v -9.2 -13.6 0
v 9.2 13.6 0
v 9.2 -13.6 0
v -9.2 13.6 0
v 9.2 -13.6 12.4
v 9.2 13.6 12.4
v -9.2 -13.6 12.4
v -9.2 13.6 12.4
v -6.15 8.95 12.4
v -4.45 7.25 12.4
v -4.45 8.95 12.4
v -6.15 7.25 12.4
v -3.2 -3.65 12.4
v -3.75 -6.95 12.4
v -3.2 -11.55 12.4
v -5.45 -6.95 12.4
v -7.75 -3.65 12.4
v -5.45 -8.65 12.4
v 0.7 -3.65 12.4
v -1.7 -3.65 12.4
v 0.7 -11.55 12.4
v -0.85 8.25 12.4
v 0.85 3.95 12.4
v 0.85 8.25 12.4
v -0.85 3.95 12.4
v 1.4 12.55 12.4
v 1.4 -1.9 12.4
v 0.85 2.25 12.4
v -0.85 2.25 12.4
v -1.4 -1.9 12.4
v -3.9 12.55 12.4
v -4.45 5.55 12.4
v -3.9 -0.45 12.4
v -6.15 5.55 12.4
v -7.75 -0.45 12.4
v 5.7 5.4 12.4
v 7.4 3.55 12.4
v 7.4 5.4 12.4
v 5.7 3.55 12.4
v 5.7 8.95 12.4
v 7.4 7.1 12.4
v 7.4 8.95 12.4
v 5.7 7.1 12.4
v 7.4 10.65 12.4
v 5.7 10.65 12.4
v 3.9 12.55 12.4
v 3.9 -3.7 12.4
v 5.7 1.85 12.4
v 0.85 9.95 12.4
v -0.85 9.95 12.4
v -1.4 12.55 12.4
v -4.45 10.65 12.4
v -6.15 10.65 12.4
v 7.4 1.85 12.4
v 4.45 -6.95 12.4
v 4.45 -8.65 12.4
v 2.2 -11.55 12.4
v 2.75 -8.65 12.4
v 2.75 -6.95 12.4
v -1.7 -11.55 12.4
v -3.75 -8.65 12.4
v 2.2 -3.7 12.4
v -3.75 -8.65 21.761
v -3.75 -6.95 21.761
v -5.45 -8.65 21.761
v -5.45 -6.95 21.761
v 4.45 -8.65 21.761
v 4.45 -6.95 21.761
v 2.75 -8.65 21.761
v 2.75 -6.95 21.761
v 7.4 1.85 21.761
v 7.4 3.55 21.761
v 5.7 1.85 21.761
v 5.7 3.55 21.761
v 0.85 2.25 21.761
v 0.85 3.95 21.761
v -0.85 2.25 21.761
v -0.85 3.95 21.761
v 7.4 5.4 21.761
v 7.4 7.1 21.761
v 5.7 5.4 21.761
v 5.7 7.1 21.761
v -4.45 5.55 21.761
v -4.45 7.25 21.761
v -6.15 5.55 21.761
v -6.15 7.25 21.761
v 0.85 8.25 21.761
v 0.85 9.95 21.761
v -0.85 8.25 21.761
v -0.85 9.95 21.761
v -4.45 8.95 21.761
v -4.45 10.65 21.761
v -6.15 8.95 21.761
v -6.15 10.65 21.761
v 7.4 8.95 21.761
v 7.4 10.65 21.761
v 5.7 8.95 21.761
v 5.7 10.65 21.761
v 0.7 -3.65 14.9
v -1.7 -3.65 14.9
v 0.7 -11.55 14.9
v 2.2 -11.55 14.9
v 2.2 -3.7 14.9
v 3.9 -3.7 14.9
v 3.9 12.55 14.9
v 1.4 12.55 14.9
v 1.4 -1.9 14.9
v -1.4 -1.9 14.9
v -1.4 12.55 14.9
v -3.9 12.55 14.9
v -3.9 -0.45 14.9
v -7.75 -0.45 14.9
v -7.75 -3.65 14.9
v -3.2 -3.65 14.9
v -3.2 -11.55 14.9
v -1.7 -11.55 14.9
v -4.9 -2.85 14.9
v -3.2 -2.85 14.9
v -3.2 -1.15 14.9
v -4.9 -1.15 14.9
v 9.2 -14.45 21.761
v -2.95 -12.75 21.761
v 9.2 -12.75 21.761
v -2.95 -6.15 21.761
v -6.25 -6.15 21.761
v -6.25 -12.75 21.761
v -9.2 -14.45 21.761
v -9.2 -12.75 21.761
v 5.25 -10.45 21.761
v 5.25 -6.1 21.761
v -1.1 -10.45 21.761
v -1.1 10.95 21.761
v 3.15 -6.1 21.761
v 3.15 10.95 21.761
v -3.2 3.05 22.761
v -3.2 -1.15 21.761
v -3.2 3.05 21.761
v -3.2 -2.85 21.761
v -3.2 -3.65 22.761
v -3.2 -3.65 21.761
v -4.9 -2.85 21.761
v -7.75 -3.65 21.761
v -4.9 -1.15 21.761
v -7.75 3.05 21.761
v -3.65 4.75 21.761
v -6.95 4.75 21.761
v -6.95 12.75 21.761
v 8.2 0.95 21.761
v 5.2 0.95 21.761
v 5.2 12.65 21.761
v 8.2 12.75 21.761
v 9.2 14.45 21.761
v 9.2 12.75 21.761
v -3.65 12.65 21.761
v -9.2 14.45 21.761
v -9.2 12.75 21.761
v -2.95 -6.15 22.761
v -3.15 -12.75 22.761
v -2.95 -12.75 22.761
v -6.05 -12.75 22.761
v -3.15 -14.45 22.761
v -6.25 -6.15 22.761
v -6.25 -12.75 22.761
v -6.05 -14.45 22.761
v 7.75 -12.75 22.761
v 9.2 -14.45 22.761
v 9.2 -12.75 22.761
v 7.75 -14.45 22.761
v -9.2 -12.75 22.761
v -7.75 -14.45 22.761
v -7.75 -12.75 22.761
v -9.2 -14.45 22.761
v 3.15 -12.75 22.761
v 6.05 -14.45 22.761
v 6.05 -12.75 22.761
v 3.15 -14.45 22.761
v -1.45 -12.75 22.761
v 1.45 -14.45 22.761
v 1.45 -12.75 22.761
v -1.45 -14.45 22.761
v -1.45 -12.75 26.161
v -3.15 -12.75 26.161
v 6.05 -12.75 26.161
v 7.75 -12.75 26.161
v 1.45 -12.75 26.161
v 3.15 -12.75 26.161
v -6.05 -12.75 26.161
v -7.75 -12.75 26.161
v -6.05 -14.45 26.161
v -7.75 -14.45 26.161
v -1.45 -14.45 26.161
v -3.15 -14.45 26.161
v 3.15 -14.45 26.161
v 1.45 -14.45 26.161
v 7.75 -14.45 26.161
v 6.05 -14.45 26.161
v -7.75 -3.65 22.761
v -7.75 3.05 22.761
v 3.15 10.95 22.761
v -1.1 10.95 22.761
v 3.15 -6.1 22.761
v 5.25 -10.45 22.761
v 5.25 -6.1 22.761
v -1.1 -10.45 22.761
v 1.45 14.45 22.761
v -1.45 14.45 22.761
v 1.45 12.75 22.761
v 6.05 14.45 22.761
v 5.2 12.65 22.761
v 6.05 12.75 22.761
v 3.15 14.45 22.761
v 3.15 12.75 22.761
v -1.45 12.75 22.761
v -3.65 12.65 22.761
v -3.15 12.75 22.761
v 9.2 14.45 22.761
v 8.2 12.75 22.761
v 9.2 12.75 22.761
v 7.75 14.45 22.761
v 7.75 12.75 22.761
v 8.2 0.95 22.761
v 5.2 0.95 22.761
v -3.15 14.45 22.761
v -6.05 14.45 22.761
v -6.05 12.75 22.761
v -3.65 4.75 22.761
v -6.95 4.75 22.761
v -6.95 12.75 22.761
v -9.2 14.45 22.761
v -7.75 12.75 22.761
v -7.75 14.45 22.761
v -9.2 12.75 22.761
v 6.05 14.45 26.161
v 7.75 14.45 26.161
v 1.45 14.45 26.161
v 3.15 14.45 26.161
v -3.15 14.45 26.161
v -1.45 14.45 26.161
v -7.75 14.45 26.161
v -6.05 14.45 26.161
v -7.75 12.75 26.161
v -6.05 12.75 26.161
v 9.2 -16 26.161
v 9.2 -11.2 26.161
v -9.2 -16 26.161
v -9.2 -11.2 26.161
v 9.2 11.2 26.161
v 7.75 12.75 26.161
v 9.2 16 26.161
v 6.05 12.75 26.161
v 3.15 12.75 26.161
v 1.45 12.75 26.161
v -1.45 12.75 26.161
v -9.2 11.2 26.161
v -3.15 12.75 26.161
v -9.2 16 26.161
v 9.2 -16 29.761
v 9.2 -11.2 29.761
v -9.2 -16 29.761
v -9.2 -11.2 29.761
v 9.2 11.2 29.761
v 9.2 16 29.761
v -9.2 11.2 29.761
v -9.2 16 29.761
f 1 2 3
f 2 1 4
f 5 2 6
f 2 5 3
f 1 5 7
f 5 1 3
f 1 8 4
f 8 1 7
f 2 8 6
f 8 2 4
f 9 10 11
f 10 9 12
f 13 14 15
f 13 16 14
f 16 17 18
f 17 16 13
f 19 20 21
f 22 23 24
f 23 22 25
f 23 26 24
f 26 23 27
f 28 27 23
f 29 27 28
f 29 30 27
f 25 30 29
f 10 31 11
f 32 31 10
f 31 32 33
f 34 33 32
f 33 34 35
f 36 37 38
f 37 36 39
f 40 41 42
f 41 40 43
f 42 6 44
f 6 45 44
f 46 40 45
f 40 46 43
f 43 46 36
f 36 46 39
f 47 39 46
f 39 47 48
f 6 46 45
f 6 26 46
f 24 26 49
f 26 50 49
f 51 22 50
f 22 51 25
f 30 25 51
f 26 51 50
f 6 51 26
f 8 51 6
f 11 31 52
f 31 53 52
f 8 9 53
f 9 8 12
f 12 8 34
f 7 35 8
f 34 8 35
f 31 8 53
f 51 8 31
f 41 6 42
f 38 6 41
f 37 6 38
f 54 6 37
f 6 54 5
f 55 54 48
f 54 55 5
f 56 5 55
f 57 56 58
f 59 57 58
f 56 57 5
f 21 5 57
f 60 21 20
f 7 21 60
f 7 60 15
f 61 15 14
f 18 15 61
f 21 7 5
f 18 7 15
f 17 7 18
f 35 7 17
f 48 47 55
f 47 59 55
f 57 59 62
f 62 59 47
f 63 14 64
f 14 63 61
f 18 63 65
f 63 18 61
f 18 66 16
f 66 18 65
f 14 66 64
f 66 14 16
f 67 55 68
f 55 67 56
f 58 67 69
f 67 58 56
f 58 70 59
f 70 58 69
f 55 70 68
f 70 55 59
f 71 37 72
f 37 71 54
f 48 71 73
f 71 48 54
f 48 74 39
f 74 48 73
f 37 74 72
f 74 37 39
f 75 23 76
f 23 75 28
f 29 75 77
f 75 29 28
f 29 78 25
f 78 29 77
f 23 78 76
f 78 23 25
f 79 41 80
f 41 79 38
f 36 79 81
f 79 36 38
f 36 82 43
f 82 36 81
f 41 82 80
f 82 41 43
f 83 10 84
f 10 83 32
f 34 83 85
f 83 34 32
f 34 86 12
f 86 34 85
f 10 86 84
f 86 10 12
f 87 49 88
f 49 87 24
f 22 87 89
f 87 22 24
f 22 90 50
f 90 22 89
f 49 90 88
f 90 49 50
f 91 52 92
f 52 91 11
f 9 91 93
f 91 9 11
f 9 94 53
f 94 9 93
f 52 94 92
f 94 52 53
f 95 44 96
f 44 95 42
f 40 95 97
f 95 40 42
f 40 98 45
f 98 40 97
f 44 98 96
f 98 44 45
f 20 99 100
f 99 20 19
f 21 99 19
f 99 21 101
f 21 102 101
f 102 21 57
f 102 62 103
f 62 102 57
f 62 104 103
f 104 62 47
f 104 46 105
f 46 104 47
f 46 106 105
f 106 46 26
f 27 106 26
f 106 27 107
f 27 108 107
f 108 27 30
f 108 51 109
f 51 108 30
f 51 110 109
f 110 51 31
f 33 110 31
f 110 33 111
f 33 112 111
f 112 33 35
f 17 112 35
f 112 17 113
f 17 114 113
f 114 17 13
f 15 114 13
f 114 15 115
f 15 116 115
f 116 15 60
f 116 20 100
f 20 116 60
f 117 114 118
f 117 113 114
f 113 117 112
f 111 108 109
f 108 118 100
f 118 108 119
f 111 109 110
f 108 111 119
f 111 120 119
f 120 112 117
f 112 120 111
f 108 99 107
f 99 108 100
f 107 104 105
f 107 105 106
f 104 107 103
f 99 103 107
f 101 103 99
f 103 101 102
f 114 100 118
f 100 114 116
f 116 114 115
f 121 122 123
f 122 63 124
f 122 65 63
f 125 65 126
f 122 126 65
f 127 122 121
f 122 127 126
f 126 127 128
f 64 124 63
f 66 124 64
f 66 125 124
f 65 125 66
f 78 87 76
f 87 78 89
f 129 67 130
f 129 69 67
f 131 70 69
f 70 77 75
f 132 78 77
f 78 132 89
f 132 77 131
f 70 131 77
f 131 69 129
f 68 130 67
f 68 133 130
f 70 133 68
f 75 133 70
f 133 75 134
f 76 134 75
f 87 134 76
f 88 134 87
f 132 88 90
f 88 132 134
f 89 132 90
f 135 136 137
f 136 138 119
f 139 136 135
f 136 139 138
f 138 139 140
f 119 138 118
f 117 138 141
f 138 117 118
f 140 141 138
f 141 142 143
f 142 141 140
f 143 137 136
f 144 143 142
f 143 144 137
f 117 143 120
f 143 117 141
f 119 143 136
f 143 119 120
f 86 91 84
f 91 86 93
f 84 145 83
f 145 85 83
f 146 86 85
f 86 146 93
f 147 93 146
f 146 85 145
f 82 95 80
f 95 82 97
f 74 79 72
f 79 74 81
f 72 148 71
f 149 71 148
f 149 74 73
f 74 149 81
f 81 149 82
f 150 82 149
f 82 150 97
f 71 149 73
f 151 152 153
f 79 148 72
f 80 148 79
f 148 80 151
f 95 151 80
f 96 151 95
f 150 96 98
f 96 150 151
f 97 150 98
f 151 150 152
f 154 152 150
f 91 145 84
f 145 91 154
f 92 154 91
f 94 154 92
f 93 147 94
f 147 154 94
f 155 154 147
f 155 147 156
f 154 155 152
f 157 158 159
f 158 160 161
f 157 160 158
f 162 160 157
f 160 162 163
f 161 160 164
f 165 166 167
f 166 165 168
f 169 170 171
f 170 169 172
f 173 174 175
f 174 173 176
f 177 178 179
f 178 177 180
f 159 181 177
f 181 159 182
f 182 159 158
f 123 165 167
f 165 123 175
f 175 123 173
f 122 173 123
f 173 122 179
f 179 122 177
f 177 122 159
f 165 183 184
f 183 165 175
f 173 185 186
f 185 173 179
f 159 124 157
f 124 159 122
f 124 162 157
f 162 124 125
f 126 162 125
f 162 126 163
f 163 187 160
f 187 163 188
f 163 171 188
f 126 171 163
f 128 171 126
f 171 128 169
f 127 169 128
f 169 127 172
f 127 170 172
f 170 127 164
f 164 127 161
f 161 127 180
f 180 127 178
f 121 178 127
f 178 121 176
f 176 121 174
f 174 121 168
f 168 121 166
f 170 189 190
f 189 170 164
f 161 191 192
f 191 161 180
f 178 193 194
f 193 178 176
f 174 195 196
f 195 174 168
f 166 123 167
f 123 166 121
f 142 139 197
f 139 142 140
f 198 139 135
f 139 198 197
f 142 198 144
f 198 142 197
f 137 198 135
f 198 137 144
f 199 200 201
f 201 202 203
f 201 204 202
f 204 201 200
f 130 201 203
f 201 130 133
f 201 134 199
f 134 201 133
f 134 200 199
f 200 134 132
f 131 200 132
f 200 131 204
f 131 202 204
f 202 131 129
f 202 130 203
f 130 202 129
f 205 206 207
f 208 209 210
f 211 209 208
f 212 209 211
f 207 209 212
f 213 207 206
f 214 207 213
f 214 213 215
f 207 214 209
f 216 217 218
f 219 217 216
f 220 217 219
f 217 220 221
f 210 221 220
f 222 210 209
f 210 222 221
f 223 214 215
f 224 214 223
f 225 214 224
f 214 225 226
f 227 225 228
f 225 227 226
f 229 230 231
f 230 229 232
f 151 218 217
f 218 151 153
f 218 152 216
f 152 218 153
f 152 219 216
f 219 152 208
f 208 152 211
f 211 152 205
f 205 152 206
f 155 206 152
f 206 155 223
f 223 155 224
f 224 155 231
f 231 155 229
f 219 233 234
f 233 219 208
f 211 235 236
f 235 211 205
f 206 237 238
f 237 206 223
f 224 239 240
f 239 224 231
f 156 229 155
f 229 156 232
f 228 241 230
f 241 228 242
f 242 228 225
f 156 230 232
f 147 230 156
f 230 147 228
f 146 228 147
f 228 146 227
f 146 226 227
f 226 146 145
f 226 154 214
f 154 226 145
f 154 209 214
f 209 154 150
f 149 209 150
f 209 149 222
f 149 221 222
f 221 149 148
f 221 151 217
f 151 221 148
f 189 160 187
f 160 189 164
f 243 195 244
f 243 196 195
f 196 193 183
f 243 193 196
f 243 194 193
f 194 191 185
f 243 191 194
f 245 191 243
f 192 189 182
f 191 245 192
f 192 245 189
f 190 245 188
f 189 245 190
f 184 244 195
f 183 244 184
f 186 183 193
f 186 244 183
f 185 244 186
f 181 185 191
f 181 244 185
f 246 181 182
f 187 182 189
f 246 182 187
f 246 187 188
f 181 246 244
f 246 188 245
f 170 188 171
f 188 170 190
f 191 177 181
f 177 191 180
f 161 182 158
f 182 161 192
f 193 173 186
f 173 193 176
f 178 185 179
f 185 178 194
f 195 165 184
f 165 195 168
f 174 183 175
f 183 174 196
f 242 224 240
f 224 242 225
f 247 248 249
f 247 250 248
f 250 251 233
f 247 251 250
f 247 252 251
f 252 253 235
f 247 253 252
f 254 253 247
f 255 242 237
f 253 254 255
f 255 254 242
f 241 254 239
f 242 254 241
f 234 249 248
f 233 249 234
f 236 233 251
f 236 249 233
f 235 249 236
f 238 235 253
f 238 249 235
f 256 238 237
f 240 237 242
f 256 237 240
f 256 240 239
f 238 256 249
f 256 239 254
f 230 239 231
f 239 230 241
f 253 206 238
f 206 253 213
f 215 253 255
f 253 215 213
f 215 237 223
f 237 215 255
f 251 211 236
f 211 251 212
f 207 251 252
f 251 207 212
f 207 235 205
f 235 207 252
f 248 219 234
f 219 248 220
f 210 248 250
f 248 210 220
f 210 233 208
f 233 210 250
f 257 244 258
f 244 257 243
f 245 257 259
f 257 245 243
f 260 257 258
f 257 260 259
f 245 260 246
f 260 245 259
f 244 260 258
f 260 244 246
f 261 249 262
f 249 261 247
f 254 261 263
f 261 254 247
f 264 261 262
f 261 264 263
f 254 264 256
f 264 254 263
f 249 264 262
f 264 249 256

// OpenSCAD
// Generated by SolidPython 0.4.2 on 2020-09-29 23:20:22
//!OpenSCAD

scale(v = 0.0100000000) {
	translate(v = [-920, -1360, 0]) {
		union() {
			color(c = [0.4000000000, 0.4000000000, 0.4000000000]) {
				translate(v = [0, 0, 0]) {
					linear_extrude(height = 1000.0000000000) {
						polygon(paths = [[0, 1, 2, 3]], points = [[0, 0], [0, 2720], [1840, 2720], [1840, 0]]);
					}
				}
			}
			color(c = [0.2000000000, 0.6000000000, 0.2000000000]) {
				translate(v = [0, 0, 1000.0000000000]) {
					linear_extrude(height = 120.0000000000) {
						polygon(paths = [[0, 1, 2, 3]], points = [[0, 1305], [0, 2720], [1840, 2720], [1840, 1305]]);
					}
				}
			}
			color(c = [0.4000000000, 0.4000000000, 0.4000000000]) {
				translate(v = [0, 0, 1000.0000000000]) {
					linear_extrude(height = 120.0000000000) {
						polygon(paths = [[0, 1, 2, 3]], points = [[0, 0], [0, 1305], [1840, 1305], [1840, 0]]);
					}
				}
			}
			color(c = [0.9000000000, 0.6000000000, 0.6000000000]) {
				translate(v = [0, 0, 1120.0000000000]) {
					linear_extrude(height = 120.0000000000) {
						polygon(paths = [[0, 1, 2, 3]], points = [[265, 1485], [265, 2485], [530, 2485], [530, 1485]]);
					}
				}
			}
			color(c = [0.9000000000, 0.6000000000, 0.6000000000]) {
				translate(v = [0, 0, 1120.0000000000]) {
					linear_extrude(height = 120.0000000000) {
						polygon(paths = [[0, 1, 2, 3]], points = [[780, 1485], [780, 2485], [1060, 2485], [1060, 1485]]);
					}
				}
			}
			color(c = [0.9000000000, 0.6000000000, 0.6000000000]) {
				translate(v = [0, 0, 1120.0000000000]) {
					linear_extrude(height = 120.0000000000) {
						polygon(paths = [[0, 1, 2, 3]], points = [[1310, 1485], [1310, 2485], [1700, 2485], [1700, 1485]]);
					}
				}
			}
			color(c = [0.9000000000, 0.6000000000, 0.9000000000]) {
				translate(v = [0, 0, 1120.0000000000]) {
					linear_extrude(height = 120.0000000000) {
						polygon(paths = [[0, 1, 2, 3]], points = [[315, 335], [315, 885], [600, 885], [600, 335]]);
					}
				}
			}
			color(c = [0.9000000000, 0.6000000000, 0.9000000000]) {
				translate(v = [0, 0, 1120.0000000000]) {
					linear_extrude(height = 120.0000000000) {
						polygon(paths = [[0, 1, 2, 3]], points = [[750, 335], [750, 885], [990, 885], [990, 335]]);
					}
				}
			}
			color(c = [0.9000000000, 0.6000000000, 0.9000000000]) {
				translate(v = [0, 0, 1120.0000000000]) {
					linear_extrude(height = 120.0000000000) {
						polygon(paths = [[0, 1, 2, 3]], points = [[1140, 335], [1140, 885], [1425, 885], [1425, 335]]);
					}
				}
			}
			color(c = [0.2000000000, 0.6000000000, 0.2000000000]) {
				translate(v = [0, 0, 1120.0000000000]) {
					linear_extrude(height = 120.0000000000) {
						difference() {
							polygon(paths = [[0, 1, 2, 3]], points = [[0, 1305], [0, 2720], [1840, 2720], [1840, 1305]]);
							polygon(paths = [[0, 1, 2, 3]], points = [[265, 1485], [530, 1485], [530, 2485], [265, 2485]]);
							polygon(paths = [[0, 1, 2, 3]], points = [[780, 1485], [1060, 1485], [1060, 2485], [780, 2485]]);
							polygon(paths = [[0, 1, 2, 3]], points = [[1310, 1485], [1700, 1485], [1700, 2485], [1310, 2485]]);
						}
					}
				}
			}
			color(c = [0.4000000000, 0.4000000000, 0.4000000000]) {
				translate(v = [0, 0, 1120.0000000000]) {
					linear_extrude(height = 120.0000000000) {
						difference() {
							polygon(paths = [[0, 1, 2, 3]], points = [[0, 0], [0, 1305], [1840, 1305], [1840, 0]]);
							polygon(paths = [[0, 1, 2, 3]], points = [[315, 335], [600, 335], [600, 885], [315, 885]]);
							polygon(paths = [[0, 1, 2, 3]], points = [[750, 335], [990, 335], [990, 885], [750, 885]]);
							polygon(paths = [[0, 1, 2, 3]], points = [[1140, 335], [1425, 335], [1425, 885], [1140, 885]]);
						}
					}
				}
			}
			color(c = [0.1000000000, 0.1000000000, 0.1000000000]) {
				translate(v = [0, 0, 1240.0000000000]) {
					linear_extrude(height = 70.0000000000) {
						polygon(paths = [[0, 1, 2, 3]], points = [[375, 495], [375, 665], [545, 665], [545, 495]]);
					}
				}
			}
			color(c = [0.1000000000, 0.1000000000, 0.1000000000]) {
				translate(v = [0, 0, 1240.0000000000]) {
					linear_extrude(height = 70.0000000000) {
						polygon(paths = [[0, 1, 2, 3]], points = [[1195, 495], [1195, 665], [1365, 665], [1365, 495]]);
					}
				}
			}
			color(c = [0.1000000000, 0.1000000000, 0.1000000000]) {
				translate(v = [0, 0, 1240.0000000000]) {
					linear_extrude(height = 70.0000000000) {
						polygon(paths = [[0, 1, 2, 3]], points = [[1490, 1545], [1490, 1715], [1660, 1715], [1660, 1545]]);
					}
				}
			}
			color(c = [0.1000000000, 0.1000000000, 0.1000000000]) {
				translate(v = [0, 0, 1240.0000000000]) {
					linear_extrude(height = 70.0000000000) {
						polygon(paths = [[0, 1, 2, 3]], points = [[835, 1585], [835, 1755], [1005, 1755], [1005, 1585]]);
					}
				}
			}
			color(c = [0.1000000000, 0.1000000000, 0.1000000000]) {
				translate(v = [0, 0, 1240.0000000000]) {
					linear_extrude(height = 70.0000000000) {
						polygon(paths = [[0, 1, 2, 3]], points = [[1490, 1900], [1490, 2070], [1660, 2070], [1660, 1900]]);
					}
				}
			}
			color(c = [0.1000000000, 0.1000000000, 0.1000000000]) {
				translate(v = [0, 0, 1240.0000000000]) {
					linear_extrude(height = 70.0000000000) {
						polygon(paths = [[0, 1, 2, 3]], points = [[305, 1915], [305, 2085], [475, 2085], [475, 1915]]);
					}
				}
			}
			color(c = [0.1000000000, 0.1000000000, 0.1000000000]) {
				translate(v = [0, 0, 1240.0000000000]) {
					linear_extrude(height = 70.0000000000) {
						polygon(paths = [[0, 1, 2, 3]], points = [[835, 2185], [835, 2355], [1005, 2355], [1005, 2185]]);
					}
				}
			}
			color(c = [0.1000000000, 0.1000000000, 0.1000000000]) {
				translate(v = [0, 0, 1240.0000000000]) {
					linear_extrude(height = 70.0000000000) {
						polygon(paths = [[0, 1, 2, 3]], points = [[305, 2255], [305, 2425], [475, 2425], [475, 2255]]);
					}
				}
			}
			color(c = [0.1000000000, 0.1000000000, 0.1000000000]) {
				translate(v = [0, 0, 1240.0000000000]) {
					linear_extrude(height = 70.0000000000) {
						polygon(paths = [[0, 1, 2, 3]], points = [[1490, 2255], [1490, 2425], [1660, 2425], [1660, 2255]]);
					}
				}
			}
			color(c = [1.0000000000, 1.0000000000, 1.0000000000]) {
				translate(v = [0, 0, 1240.0000000000]) {
					linear_extrude(height = 70.0000000000) {
						polygon(paths = [[0, 1, 2, 3, 4, 5, 6, 7, 8, 9, 10, 11, 12, 13, 14, 15, 16, 17]], points = [[600, 205], [600, 995], [145, 995], [145, 1315], [530, 1315], [530, 2615], [780, 2615], [780, 1170], [1060, 1170], [1060, 2615], [1310, 2615], [1310, 990], [1140, 990], [1140, 205], [990, 205], [990, 995], [750, 995], [750, 205]]);
					}
				}
			}
			color(c = [0.1000000000, 0.1000000000, 0.1000000000]) {
				translate(v = [0, 0, 1310.0000000000]) {
					linear_extrude(height = 180.0000000000) {
						polygon(paths = [[0, 1, 2, 3]], points = [[375, 495], [375, 665], [545, 665], [545, 495]]);
					}
				}
			}
			color(c = [0.1000000000, 0.1000000000, 0.1000000000]) {
				translate(v = [0, 0, 1310.0000000000]) {
					linear_extrude(height = 180.0000000000) {
						polygon(paths = [[0, 1, 2, 3]], points = [[1195, 495], [1195, 665], [1365, 665], [1365, 495]]);
					}
				}
			}
			color(c = [0.1000000000, 0.1000000000, 0.1000000000]) {
				translate(v = [0, 0, 1310.0000000000]) {
					linear_extrude(height = 180.0000000000) {
						polygon(paths = [[0, 1, 2, 3]], points = [[1490, 1545], [1490, 1715], [1660, 1715], [1660, 1545]]);
					}
				}
			}
			color(c = [0.1000000000, 0.1000000000, 0.1000000000]) {
				translate(v = [0, 0, 1310.0000000000]) {
					linear_extrude(height = 180.0000000000) {
						polygon(paths = [[0, 1, 2, 3]], points = [[835, 1585], [835, 1755], [1005, 1755], [1005, 1585]]);
					}
				}
			}
			color(c = [0.1000000000, 0.1000000000, 0.1000000000]) {
				translate(v = [0, 0, 1310.0000000000]) {
					linear_extrude(height = 180.0000000000) {
						polygon(paths = [[0, 1, 2, 3]], points = [[1490, 1900], [1490, 2070], [1660, 2070], [1660, 1900]]);
					}
				}
			}
			color(c = [0.1000000000, 0.1000000000, 0.1000000000]) {
				translate(v = [0, 0, 1310.0000000000]) {
					linear_extrude(height = 180.0000000000) {
						polygon(paths = [[0, 1, 2, 3]], points = [[305, 1915], [305, 2085], [475, 2085], [475, 1915]]);
					}
				}
			}
			color(c = [0.1000000000, 0.1000000000, 0.1000000000]) {
				translate(v = [0, 0, 1310.0000000000]) {
					linear_extrude(height = 180.0000000000) {
						polygon(paths = [[0, 1, 2, 3]], points = [[835, 2185], [835, 2355], [1005, 2355], [1005, 2185]]);
					}
				}
			}
			color(c = [0.1000000000, 0.1000000000, 0.1000000000]) {
				translate(v = [0, 0, 1310.0000000000]) {
					linear_extrude(height = 180.0000000000) {
						polygon(paths = [[0, 1, 2, 3]], points = [[305, 2255], [305, 2425], [475, 2425], [475, 2255]]);
					}
				}
			}
			color(c = [0.1000000000, 0.1000000000, 0.1000000000]) {
				translate(v = [0, 0, 1310.0000000000]) {
					linear_extrude(height = 180.0000000000) {
						polygon(paths = [[0, 1, 2, 3]], points = [[1490, 2255], [1490, 2425], [1660, 2425], [1660, 2255]]);
					}
				}
			}
			color(c = [0.7000000000, 0, 0]) {
				translate(v = [0, 0, 1310.0000000000]) {
					linear_extrude(height = 180.0000000000) {
						polygon(paths = [[0, 1, 2, 3, 4, 5, 6, 7, 8, 9, 10, 11, 12, 13, 14, 15, 16, 17]], points = [[600, 205], [600, 995], [145, 995], [145, 1315], [530, 1315], [530, 2615], [780, 2615], [780, 1170], [1060, 1170], [1060, 2615], [1310, 2615], [1310, 990], [1140, 990], [1140, 205], [990, 205], [990, 995], [750, 995], [750, 205]]);
					}
				}
			}
			color(c = [0.1000000000, 0.1000000000, 0.1000000000]) {
				translate(v = [0, 0, 1490.0000000000]) {
					linear_extrude(height = 686.1000000000) {
						polygon(paths = [[0, 1, 2, 3]], points = [[375, 495], [375, 665], [545, 665], [545, 495]]);
					}
				}
			}
			color(c = [0.1000000000, 0.1000000000, 0.1000000000]) {
				translate(v = [0, 0, 1490.0000000000]) {
					linear_extrude(height = 686.1000000000) {
						polygon(paths = [[0, 1, 2, 3]], points = [[1195, 495], [1195, 665], [1365, 665], [1365, 495]]);
					}
				}
			}
			color(c = [0.1000000000, 0.1000000000, 0.1000000000]) {
				translate(v = [0, 0, 1490.0000000000]) {
					linear_extrude(height = 686.1000000000) {
						polygon(paths = [[0, 1, 2, 3]], points = [[430, 1075], [430, 1245], [600, 1245], [600, 1075]]);
					}
				}
			}
			color(c = [0.1000000000, 0.1000000000, 0.1000000000]) {
				translate(v = [0, 0, 1490.0000000000]) {
					linear_extrude(height = 686.1000000000) {
						polygon(paths = [[0, 1, 2, 3]], points = [[1490, 1545], [1490, 1715], [1660, 1715], [1660, 1545]]);
					}
				}
			}
			color(c = [0.1000000000, 0.1000000000, 0.1000000000]) {
				translate(v = [0, 0, 1490.0000000000]) {
					linear_extrude(height = 686.1000000000) {
						polygon(paths = [[0, 1, 2, 3]], points = [[835, 1585], [835, 1755], [1005, 1755], [1005, 1585]]);
					}
				}
			}
			color(c = [0.1000000000, 0.1000000000, 0.1000000000]) {
				translate(v = [0, 0, 1490.0000000000]) {
					linear_extrude(height = 686.1000000000) {
						polygon(paths = [[0, 1, 2, 3]], points = [[1490, 1900], [1490, 2070], [1660, 2070], [1660, 1900]]);
					}
				}
			}
			color(c = [0.1000000000, 0.1000000000, 0.1000000000]) {
				translate(v = [0, 0, 1490.0000000000]) {
					linear_extrude(height = 686.1000000000) {
						polygon(paths = [[0, 1, 2, 3]], points = [[305, 1915], [305, 2085], [475, 2085], [475, 1915]]);
					}
				}
			}
			color(c = [0.1000000000, 0.1000000000, 0.1000000000]) {
				translate(v = [0, 0, 1490.0000000000]) {
					linear_extrude(height = 686.1000000000) {
						polygon(paths = [[0, 1, 2, 3]], points = [[835, 2185], [835, 2355], [1005, 2355], [1005, 2185]]);
					}
				}
			}
			color(c = [0.1000000000, 0.1000000000, 0.1000000000]) {
				translate(v = [0, 0, 1490.0000000000]) {
					linear_extrude(height = 686.1000000000) {
						polygon(paths = [[0, 1, 2, 3]], points = [[305, 2255], [305, 2425], [475, 2425], [475, 2255]]);
					}
				}
			}
			color(c = [0.1000000000, 0.1000000000, 0.1000000000]) {
				translate(v = [0, 0, 1490.0000000000]) {
					linear_extrude(height = 686.1000000000) {
						polygon(paths = [[0, 1, 2, 3]], points = [[1490, 2255], [1490, 2425], [1660, 2425], [1660, 2255]]);
					}
				}
			}
			color(c = [0.9000000000, 0.6000000000, 0.6000000000]) {
				translate(v = [0, 0, 2176.1000000000]) {
					linear_extrude(height = 100.0000000000) {
						polygon(paths = [[0, 1, 2, 3, 4, 5, 6, 7]], points = [[0, -85], [0, 85], [295, 85], [295, 745], [625, 745], [625, 85], [1840, 85], [1840, -85]]);
					}
				}
			}
			color(c = [0.9000000000, 0.6000000000, 0.6000000000]) {
				translate(v = [0, 0, 2176.1000000000]) {
					linear_extrude(height = 100.0000000000) {
						polygon(paths = [[0, 1, 2, 3]], points = [[145, 995], [145, 1665], [600, 1665], [600, 995]]);
					}
				}
			}
			color(c = [0.9000000000, 0.6000000000, 0.6000000000]) {
				translate(v = [0, 0, 2176.1000000000]) {
					linear_extrude(height = 100.0000000000) {
						polygon(paths = [[0, 1, 2, 3, 4, 5]], points = [[810, 315], [810, 2455], [1235, 2455], [1235, 750], [1445, 750], [1445, 315]]);
					}
				}
			}
			color(c = [0.9000000000, 0.6000000000, 0.6000000000]) {
				translate(v = [0, 0, 2176.1000000000]) {
					linear_extrude(height = 100.0000000000) {
						polygon(paths = [[0, 1, 2, 3, 4, 5, 6, 7, 8, 9, 10, 11]], points = [[1440, 1455], [1440, 2625], [555, 2625], [555, 1835], [225, 1835], [225, 2635], [0, 2635], [0, 2805], [1840, 2805], [1840, 2635], [1740, 2635], [1740, 1455]]);
					}
				}
			}
			color(c = [0.5000000000, 0.5000000000, 0.5000000000]) {
				translate(v = [0, 0, 2276.1000000000]) {
					linear_extrude(height = 340.0000000000) {
						polygon(paths = [[0, 1, 2, 3]], points = [[145, -85], [145, 85], [315, 85], [315, -85]]);
					}
				}
			}
			color(c = [0.5000000000, 0.5000000000, 0.5000000000]) {
				translate(v = [0, 0, 2276.1000000000]) {
					linear_extrude(height = 340.0000000000) {
						polygon(paths = [[0, 1, 2, 3]], points = [[605, -85], [605, 85], [775, 85], [775, -85]]);
					}
				}
			}
			color(c = [0.5000000000, 0.5000000000, 0.5000000000]) {
				translate(v = [0, 0, 2276.1000000000]) {
					linear_extrude(height = 340.0000000000) {
						polygon(paths = [[0, 1, 2, 3]], points = [[1065, -85], [1065, 85], [1235, 85], [1235, -85]]);
					}
				}
			}
			color(c = [0.5000000000, 0.5000000000, 0.5000000000]) {
				translate(v = [0, 0, 2276.1000000000]) {
					linear_extrude(height = 340.0000000000) {
						polygon(paths = [[0, 1, 2, 3]], points = [[1525, -85], [1525, 85], [1695, 85], [1695, -85]]);
					}
				}
			}
			color(c = [0.5000000000, 0.5000000000, 0.5000000000]) {
				translate(v = [0, 0, 2276.1000000000]) {
					linear_extrude(height = 340.0000000000) {
						polygon(paths = [[0, 1, 2, 3]], points = [[145, 2635], [145, 2805], [315, 2805], [315, 2635]]);
					}
				}
			}
			color(c = [0.5000000000, 0.5000000000, 0.5000000000]) {
				translate(v = [0, 0, 2276.1000000000]) {
					linear_extrude(height = 340.0000000000) {
						polygon(paths = [[0, 1, 2, 3]], points = [[605, 2635], [605, 2805], [775, 2805], [775, 2635]]);
					}
				}
			}
			color(c = [0.5000000000, 0.5000000000, 0.5000000000]) {
				translate(v = [0, 0, 2276.1000000000]) {
					linear_extrude(height = 340.0000000000) {
						polygon(paths = [[0, 1, 2, 3]], points = [[1065, 2635], [1065, 2805], [1235, 2805], [1235, 2635]]);
					}
				}
			}
			color(c = [0.5000000000, 0.5000000000, 0.5000000000]) {
				translate(v = [0, 0, 2276.1000000000]) {
					linear_extrude(height = 340.0000000000) {
						polygon(paths = [[0, 1, 2, 3]], points = [[1525, 2635], [1525, 2805], [1695, 2805], [1695, 2635]]);
					}
				}
			}
			color(c = [0.3000000000, 0.3000000000, 1]) {
				translate(v = [0, 0, 2616.1000000000]) {
					linear_extrude(height = 360.0000000000) {
						polygon(paths = [[0, 1, 2, 3]], points = [[0, -240], [0, 240], [1840, 240], [1840, -240]]);
					}
				}
			}
			color(c = [0.3000000000, 0.3000000000, 1]) {
				translate(v = [0, 0, 2616.1000000000]) {
					linear_extrude(height = 360.0000000000) {
						polygon(paths = [[0, 1, 2, 3]], points = [[0, 2480], [0, 2960], [1840, 2960], [1840, 2480]]);
					}
				}
			}
		}
	}
}
